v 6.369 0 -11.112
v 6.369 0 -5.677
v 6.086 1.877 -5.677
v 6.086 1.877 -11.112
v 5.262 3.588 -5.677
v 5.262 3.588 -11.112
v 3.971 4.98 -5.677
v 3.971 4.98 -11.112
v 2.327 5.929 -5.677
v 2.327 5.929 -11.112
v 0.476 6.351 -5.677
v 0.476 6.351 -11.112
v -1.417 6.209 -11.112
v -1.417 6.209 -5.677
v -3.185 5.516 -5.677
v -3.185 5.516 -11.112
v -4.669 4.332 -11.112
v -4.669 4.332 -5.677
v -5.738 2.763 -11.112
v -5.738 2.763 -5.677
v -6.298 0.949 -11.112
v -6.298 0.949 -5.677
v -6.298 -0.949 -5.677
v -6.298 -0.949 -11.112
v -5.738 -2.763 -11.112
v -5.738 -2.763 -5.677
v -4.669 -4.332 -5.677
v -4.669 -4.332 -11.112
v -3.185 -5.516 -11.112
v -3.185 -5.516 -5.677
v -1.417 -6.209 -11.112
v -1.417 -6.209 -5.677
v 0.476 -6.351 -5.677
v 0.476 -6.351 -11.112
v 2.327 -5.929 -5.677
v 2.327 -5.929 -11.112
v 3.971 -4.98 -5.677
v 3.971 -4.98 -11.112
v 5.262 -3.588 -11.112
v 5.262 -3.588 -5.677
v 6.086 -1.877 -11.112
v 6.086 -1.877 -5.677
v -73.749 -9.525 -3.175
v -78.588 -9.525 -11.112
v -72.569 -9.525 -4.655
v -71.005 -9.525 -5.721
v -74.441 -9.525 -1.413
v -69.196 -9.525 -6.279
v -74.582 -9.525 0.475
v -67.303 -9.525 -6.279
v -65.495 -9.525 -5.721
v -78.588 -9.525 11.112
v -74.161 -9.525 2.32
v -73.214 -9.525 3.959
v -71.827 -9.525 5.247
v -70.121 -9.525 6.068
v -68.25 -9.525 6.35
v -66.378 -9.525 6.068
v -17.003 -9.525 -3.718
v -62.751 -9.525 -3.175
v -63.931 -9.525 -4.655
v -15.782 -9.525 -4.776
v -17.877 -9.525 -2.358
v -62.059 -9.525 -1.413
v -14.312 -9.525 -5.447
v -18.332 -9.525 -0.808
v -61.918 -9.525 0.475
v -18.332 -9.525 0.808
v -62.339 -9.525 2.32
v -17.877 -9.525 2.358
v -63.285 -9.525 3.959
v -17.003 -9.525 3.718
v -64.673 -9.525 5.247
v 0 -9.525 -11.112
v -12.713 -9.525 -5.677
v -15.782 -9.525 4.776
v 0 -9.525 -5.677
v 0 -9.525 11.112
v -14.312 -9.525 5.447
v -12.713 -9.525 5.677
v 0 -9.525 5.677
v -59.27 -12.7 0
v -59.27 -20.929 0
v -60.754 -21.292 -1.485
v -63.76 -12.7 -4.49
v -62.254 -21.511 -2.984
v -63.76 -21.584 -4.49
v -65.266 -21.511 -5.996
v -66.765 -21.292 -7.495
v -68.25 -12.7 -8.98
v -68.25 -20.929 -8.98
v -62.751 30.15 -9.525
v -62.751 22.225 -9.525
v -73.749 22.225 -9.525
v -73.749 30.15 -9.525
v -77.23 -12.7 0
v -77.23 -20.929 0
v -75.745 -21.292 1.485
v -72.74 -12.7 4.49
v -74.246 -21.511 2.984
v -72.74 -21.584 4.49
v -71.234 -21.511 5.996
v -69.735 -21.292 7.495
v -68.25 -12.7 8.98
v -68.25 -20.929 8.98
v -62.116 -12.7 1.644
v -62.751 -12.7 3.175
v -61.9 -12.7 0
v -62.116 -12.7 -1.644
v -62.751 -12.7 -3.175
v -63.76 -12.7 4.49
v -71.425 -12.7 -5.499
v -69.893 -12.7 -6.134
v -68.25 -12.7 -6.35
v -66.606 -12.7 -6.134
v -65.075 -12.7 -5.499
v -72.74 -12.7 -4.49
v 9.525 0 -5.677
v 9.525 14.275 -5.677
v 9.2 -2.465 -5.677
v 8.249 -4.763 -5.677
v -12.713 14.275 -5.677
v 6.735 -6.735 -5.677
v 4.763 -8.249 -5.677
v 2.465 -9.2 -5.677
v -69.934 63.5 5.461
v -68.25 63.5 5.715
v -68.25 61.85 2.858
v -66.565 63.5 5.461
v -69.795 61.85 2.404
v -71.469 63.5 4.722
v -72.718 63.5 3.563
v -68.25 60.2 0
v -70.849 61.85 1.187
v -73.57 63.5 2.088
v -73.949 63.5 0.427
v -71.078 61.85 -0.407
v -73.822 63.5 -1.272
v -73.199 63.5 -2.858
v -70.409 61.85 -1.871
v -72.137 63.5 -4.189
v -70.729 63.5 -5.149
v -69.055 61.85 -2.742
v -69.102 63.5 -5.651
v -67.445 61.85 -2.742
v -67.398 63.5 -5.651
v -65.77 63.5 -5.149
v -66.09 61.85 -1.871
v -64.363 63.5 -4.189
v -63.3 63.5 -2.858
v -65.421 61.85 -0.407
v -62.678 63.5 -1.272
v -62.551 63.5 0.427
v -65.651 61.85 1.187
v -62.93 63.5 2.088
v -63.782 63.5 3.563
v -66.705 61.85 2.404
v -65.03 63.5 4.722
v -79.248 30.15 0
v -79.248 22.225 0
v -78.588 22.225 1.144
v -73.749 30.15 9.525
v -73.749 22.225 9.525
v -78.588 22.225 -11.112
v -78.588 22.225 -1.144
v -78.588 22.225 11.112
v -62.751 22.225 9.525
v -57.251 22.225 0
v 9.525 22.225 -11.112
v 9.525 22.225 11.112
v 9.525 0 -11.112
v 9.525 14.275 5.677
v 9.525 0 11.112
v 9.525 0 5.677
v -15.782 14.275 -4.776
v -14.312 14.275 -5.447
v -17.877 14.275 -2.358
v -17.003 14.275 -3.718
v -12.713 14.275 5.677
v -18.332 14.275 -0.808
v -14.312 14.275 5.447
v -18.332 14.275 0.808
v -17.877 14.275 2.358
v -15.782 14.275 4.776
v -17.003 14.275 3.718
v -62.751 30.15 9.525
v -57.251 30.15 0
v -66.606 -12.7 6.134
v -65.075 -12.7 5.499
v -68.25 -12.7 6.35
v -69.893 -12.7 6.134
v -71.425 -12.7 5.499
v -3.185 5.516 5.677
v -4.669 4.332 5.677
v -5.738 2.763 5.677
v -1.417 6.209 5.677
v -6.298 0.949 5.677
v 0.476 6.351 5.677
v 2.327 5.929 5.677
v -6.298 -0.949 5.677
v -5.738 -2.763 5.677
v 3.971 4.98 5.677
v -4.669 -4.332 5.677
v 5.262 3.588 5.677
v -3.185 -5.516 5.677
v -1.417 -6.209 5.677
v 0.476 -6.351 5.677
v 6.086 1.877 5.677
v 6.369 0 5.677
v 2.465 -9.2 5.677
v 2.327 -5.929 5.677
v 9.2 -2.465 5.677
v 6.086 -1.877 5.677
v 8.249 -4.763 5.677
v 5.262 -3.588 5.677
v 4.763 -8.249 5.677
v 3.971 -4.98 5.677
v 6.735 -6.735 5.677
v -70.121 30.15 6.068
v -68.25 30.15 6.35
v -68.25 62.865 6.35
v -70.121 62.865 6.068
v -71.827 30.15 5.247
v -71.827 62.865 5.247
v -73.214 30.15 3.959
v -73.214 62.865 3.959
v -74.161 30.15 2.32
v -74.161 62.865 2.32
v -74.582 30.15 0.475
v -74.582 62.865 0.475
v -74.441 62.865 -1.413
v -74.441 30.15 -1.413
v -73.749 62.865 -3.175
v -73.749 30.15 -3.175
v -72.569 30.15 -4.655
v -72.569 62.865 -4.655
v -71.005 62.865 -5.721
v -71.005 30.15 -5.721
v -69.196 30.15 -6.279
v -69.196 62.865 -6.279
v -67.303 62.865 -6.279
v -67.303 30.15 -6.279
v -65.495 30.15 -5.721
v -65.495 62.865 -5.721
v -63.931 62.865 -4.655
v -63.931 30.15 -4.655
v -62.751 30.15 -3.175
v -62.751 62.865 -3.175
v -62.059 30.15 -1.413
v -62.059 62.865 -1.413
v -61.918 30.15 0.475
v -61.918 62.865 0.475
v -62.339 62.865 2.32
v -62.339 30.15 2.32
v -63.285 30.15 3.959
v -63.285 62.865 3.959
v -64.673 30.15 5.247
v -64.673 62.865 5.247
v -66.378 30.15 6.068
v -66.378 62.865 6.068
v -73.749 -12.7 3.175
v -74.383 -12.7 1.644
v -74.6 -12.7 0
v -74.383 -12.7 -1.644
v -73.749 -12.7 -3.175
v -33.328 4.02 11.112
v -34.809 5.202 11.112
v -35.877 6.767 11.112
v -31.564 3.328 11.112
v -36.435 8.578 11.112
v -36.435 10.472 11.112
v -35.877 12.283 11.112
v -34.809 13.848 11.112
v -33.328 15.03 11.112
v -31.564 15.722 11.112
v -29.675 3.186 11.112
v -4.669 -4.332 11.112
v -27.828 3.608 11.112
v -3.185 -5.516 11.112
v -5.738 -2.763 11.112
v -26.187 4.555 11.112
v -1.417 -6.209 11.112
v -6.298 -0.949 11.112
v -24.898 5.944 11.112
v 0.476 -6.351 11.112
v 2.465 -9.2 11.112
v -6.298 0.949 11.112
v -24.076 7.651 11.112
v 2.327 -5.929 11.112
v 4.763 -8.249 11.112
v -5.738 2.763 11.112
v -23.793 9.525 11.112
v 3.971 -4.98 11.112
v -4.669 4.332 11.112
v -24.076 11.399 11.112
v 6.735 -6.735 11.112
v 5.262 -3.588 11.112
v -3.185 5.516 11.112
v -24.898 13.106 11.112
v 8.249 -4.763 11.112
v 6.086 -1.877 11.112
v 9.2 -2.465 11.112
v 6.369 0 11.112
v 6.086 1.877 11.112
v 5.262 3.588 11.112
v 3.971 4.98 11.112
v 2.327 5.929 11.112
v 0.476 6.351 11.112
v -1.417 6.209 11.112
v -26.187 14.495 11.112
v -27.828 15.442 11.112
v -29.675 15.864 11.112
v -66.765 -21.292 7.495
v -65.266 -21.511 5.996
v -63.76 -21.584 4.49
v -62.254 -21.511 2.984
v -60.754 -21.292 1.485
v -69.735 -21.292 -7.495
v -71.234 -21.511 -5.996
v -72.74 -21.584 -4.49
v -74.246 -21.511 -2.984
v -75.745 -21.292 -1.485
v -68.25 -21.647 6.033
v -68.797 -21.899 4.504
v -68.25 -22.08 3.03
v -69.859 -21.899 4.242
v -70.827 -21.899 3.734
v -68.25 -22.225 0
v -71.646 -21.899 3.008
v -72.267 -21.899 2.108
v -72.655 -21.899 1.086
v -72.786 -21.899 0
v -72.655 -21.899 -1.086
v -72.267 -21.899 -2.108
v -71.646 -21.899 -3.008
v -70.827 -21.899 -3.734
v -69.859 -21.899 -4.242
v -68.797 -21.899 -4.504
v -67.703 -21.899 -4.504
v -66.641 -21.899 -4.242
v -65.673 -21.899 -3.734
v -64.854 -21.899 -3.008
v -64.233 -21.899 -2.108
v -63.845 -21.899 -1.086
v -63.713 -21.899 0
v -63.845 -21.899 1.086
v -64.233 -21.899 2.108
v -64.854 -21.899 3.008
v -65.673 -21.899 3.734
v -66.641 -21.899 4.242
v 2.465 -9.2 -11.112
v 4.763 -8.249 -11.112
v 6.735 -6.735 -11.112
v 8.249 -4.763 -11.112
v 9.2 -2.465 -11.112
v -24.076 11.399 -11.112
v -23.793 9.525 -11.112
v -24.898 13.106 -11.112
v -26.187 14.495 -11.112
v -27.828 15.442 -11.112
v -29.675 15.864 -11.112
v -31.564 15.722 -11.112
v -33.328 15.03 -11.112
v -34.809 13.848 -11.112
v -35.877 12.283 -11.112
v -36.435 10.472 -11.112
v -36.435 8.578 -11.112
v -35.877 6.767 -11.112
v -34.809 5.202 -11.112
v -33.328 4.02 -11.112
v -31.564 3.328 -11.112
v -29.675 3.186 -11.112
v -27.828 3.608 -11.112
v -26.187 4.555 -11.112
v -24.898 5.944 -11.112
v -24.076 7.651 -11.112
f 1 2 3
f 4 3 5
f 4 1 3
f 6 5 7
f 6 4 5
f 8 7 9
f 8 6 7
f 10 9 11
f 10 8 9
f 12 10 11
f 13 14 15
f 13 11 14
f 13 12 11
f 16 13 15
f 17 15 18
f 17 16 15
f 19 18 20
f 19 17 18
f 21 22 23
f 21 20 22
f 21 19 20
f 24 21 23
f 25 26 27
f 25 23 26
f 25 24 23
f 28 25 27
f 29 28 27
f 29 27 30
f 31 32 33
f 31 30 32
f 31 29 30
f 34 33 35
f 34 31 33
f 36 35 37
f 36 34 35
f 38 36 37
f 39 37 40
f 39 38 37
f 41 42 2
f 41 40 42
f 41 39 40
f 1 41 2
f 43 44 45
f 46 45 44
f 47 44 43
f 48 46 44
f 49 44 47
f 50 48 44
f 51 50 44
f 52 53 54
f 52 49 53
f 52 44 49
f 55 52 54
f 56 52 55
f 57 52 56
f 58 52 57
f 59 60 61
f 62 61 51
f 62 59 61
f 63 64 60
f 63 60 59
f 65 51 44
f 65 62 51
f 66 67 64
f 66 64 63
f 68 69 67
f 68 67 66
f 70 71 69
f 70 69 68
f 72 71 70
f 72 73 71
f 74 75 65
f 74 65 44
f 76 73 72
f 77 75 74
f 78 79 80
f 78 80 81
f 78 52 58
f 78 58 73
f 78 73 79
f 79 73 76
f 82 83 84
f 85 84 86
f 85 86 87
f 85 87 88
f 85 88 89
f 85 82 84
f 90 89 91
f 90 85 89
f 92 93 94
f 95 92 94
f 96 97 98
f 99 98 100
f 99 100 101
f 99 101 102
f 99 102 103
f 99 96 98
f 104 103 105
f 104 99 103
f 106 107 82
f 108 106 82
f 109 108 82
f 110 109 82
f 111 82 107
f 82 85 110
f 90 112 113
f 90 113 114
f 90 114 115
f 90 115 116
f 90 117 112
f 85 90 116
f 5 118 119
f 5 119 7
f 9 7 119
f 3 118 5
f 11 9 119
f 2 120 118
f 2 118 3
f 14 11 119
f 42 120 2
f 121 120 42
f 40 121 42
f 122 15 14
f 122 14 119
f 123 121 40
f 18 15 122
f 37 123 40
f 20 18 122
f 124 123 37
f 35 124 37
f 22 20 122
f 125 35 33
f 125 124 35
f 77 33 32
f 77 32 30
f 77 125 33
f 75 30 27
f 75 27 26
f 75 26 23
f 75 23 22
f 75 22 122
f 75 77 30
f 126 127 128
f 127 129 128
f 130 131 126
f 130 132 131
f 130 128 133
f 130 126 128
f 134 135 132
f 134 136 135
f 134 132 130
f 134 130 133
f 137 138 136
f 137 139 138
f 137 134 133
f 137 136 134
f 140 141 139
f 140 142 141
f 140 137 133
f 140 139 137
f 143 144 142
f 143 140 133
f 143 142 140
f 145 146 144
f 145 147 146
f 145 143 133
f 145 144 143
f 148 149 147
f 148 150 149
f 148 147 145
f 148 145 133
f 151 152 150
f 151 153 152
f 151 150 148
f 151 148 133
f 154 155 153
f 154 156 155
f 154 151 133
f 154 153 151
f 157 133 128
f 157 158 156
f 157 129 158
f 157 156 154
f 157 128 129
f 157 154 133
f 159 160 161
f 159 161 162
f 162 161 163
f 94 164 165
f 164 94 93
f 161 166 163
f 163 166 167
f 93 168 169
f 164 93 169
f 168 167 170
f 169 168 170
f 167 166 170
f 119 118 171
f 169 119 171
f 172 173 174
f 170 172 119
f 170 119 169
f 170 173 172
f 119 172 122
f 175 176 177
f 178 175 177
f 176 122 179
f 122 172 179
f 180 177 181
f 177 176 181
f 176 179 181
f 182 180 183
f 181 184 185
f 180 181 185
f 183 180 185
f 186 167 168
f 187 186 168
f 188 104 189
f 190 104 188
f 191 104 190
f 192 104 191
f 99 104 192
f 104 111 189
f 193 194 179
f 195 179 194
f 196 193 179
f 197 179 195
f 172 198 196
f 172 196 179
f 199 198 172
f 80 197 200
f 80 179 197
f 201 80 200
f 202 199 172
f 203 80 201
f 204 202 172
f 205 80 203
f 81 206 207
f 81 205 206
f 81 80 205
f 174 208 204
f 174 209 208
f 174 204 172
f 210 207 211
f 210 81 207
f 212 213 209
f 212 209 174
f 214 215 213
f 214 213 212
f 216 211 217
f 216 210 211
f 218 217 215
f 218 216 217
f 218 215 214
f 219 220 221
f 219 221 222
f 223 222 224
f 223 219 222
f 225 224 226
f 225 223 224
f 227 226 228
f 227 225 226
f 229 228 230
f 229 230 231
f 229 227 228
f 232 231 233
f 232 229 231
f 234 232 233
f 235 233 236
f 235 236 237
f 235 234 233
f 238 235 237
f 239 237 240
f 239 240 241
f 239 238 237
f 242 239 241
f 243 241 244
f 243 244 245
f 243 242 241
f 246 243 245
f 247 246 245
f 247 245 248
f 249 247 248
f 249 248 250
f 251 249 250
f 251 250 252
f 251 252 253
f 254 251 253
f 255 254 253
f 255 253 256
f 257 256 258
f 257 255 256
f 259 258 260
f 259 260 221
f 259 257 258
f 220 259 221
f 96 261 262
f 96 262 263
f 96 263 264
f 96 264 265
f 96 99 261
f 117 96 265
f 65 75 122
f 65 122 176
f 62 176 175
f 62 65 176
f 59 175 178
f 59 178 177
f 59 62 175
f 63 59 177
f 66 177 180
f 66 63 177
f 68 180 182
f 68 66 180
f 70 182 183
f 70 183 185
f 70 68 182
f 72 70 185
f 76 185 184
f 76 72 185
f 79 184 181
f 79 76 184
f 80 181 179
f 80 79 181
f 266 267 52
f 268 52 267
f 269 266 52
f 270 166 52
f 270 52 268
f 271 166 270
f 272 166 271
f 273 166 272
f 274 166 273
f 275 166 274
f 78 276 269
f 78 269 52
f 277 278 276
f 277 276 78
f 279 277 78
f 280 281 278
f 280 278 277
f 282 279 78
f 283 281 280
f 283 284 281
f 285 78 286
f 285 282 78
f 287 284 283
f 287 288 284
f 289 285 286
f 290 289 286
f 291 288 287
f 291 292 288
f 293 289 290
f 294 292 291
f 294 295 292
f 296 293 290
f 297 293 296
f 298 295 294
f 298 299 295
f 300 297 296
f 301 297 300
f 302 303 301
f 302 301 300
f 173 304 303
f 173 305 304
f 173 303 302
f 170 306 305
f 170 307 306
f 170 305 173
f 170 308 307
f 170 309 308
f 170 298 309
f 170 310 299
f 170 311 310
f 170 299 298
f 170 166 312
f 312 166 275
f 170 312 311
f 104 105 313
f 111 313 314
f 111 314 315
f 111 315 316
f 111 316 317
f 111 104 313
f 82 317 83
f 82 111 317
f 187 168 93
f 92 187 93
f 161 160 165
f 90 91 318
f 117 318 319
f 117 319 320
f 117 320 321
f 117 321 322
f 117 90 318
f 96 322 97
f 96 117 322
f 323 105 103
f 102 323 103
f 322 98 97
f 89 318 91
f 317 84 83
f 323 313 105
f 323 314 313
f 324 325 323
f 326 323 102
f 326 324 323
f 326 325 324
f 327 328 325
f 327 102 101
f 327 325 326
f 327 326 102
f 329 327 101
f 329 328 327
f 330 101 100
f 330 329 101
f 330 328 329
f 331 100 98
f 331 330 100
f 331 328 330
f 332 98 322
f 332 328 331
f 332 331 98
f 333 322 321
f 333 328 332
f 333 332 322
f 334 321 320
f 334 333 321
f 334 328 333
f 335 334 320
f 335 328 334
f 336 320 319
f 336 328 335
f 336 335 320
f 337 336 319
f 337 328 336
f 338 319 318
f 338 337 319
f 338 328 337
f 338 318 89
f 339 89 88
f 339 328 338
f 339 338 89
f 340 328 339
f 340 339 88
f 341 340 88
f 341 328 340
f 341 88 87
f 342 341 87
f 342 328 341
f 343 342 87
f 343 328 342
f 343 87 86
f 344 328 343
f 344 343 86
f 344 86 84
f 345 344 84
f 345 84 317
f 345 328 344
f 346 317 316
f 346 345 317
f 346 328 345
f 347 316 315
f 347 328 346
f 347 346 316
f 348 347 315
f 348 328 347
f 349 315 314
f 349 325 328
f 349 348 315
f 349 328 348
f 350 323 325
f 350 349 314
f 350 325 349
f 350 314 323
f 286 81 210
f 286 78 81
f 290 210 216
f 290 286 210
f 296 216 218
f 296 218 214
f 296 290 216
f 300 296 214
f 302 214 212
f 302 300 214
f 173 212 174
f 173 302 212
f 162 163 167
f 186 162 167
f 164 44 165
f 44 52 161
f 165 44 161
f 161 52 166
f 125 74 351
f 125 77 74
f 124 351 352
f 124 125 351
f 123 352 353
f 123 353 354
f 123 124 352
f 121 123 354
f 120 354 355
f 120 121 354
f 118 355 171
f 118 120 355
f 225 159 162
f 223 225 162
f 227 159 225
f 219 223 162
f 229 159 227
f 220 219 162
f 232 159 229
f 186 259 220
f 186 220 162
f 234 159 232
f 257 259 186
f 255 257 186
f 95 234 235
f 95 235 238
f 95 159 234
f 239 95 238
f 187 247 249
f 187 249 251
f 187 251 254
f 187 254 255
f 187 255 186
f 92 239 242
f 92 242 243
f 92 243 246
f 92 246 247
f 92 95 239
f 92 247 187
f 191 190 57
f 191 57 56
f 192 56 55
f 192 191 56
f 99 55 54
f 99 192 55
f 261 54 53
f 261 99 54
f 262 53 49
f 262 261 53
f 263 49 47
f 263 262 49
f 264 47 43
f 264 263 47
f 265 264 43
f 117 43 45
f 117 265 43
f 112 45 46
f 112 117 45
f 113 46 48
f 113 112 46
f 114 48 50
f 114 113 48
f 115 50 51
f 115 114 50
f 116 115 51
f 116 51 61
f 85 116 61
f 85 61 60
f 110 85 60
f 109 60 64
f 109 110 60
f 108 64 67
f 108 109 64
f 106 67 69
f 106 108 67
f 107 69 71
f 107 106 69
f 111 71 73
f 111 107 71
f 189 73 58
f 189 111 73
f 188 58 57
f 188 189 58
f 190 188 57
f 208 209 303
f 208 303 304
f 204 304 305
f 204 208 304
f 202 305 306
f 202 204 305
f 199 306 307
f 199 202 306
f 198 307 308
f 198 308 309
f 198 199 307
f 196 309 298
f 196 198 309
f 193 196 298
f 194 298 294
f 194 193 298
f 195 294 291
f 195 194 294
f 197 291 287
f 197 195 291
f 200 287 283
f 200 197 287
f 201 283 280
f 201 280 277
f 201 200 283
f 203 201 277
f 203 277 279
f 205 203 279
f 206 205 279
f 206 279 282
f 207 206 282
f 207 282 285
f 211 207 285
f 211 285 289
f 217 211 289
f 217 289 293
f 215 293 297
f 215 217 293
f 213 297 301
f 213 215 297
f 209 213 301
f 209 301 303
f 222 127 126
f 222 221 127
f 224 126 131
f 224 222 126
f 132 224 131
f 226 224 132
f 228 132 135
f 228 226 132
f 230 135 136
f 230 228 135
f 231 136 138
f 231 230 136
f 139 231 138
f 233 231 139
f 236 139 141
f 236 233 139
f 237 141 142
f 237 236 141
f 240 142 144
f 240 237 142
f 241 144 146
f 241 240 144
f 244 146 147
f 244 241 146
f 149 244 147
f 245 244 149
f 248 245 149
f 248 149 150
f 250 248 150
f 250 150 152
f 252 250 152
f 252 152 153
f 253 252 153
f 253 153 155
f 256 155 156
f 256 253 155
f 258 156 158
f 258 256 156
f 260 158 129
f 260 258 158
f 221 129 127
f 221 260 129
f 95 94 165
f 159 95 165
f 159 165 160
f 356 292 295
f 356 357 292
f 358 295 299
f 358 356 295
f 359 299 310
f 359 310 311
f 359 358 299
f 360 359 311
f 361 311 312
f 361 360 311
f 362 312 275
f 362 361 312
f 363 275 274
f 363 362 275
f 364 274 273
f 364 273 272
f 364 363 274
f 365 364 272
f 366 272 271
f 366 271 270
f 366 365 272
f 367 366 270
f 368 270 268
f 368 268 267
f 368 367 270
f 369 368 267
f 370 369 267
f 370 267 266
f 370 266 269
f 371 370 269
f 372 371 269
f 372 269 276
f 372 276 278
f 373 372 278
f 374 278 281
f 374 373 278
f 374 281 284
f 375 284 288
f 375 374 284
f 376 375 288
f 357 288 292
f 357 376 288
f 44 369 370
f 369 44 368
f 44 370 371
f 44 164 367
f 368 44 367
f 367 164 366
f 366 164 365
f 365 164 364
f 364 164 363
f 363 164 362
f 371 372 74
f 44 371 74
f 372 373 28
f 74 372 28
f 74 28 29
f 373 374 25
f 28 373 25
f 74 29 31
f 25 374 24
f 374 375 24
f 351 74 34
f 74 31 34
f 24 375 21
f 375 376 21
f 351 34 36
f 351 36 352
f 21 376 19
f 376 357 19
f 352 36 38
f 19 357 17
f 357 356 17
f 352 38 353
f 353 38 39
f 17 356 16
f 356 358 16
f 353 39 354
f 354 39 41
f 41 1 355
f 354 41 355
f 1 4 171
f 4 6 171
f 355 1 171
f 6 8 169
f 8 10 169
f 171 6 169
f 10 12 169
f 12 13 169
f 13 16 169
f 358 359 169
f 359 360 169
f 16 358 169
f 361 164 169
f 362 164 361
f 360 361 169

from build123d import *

# Parameters (mm, degrees)
SKETCH11_W         = 88.1126
SKETCH11_H         = 31.75
SKETCH11_R         = 6.36905
SKETCH11_R_2       = 6.35635
EXTRUDE3_DEPTH     = 11.1125
CUT_EXTRUDE1_DEPTH = 23.7998
FILLET1_R          = 9.525
EXTRUDE4_DEPTH     = 7.9248
SKETCH15_R         = 21.901149079
CUT_EXTRUDE2_DEPTH = 10.525


with BuildPart() as part:
    # Sketch11 → Extrude3 (new body, symmetric)
    with BuildSketch(Plane.XY):
        with Locations((-34.5313, 6.35)):
            Rectangle(SKETCH11_W, SKETCH11_H)
        Circle(SKETCH11_R, mode=Mode.SUBTRACT)
        with Locations((-30.1498, 9.525)):
            Circle(SKETCH11_R_2, mode=Mode.SUBTRACT)
    extrude(amount=EXTRUDE3_DEPTH, both=True)

    # Sketch12 → Cut-Extrude1 (cut)
    with BuildSketch(Plane.XZ.offset(9.525)):
        with BuildLine():
            Line((-12.7127, 5.6769), (9.525, 5.6769))
            Line((9.525, 5.6769), (9.525, -5.6769))
            Line((9.525, -5.6769), (-12.7127, -5.6769))
            ThreePointArc((-12.7127, -5.6769), (-18.3896, 0), (-12.7127, 5.6769))
        make_face()
    extrude(amount=-CUT_EXTRUDE1_DEPTH, mode=Mode.SUBTRACT)

    # Fillet1
    fillet1_edges = [part.edges().sort_by_distance(p)[0] for p in [
        (9.525, -9.525, -8.3947),
        (9.525, -9.525, 8.3947),
    ]]
    fillet(fillet1_edges, radius=FILLET1_R)

    # Sketch13 → Extrude4 (add)
    with BuildSketch(Plane(origin=(0, 22.225, 0), x_dir=(1, 0, 0), z_dir=(0, 1, 0))):
        Polygon((-57.251277372, 0), (-62.750538686, 9.525), (-73.749061314, 9.525), (-79.248322628, 0), (-73.749061314, -9.525), (-62.750538686, -9.525), align=None)
    extrude(amount=EXTRUDE4_DEPTH)

    # Sketch14 → Revolve2 (revolve)
    with BuildSketch(Plane.XY, mode=Mode.PRIVATE) as revolve2_sk:
        with BuildLine():
            Line((-68.2498, 60.200443212), (-73.9648, 63.5))
            Line((-73.9648, 63.5), (-74.5998, 62.865))
            Line((-74.5998, 62.865), (-74.5998, -12.7))
            Line((-74.5998, -12.7), (-90.150949079, -12.7))
            Line((-90.150949079, -12.7), (-90.150949079, -13.462))
            ThreePointArc((-90.150949079, -13.462), (-80.044401519, -19.952955747), (-68.2498, -22.225))
            Line((-68.2498, -22.225), (-68.2498, 60.200443212))
        make_face()
    revolve(revolve2_sk.sketch.rotate(Axis((-68.2498, 26.585218564, 0), (0, -1, 0)), 270), axis=Axis((-68.2498, 26.585218564, 0), (0, -1, 0)))  # turned: the seam where the file's is

    # Sketch15 → Cut-Extrude2 (cut, through all)
    with BuildSketch(Plane(origin=(0, -12.7, 0), x_dir=(1, 0, 0), z_dir=(0, 1, 0))):
        with Locations((-68.2498, 0)):
            Circle(SKETCH15_R)
        Polygon((-68.2498, 8.980256121), (-77.230056121, 0), (-68.2498, -8.980256121), (-59.269543879, 0), align=None, mode=Mode.SUBTRACT)
    extrude(amount=-CUT_EXTRUDE2_DEPTH, mode=Mode.SUBTRACT)


solid = part.part
